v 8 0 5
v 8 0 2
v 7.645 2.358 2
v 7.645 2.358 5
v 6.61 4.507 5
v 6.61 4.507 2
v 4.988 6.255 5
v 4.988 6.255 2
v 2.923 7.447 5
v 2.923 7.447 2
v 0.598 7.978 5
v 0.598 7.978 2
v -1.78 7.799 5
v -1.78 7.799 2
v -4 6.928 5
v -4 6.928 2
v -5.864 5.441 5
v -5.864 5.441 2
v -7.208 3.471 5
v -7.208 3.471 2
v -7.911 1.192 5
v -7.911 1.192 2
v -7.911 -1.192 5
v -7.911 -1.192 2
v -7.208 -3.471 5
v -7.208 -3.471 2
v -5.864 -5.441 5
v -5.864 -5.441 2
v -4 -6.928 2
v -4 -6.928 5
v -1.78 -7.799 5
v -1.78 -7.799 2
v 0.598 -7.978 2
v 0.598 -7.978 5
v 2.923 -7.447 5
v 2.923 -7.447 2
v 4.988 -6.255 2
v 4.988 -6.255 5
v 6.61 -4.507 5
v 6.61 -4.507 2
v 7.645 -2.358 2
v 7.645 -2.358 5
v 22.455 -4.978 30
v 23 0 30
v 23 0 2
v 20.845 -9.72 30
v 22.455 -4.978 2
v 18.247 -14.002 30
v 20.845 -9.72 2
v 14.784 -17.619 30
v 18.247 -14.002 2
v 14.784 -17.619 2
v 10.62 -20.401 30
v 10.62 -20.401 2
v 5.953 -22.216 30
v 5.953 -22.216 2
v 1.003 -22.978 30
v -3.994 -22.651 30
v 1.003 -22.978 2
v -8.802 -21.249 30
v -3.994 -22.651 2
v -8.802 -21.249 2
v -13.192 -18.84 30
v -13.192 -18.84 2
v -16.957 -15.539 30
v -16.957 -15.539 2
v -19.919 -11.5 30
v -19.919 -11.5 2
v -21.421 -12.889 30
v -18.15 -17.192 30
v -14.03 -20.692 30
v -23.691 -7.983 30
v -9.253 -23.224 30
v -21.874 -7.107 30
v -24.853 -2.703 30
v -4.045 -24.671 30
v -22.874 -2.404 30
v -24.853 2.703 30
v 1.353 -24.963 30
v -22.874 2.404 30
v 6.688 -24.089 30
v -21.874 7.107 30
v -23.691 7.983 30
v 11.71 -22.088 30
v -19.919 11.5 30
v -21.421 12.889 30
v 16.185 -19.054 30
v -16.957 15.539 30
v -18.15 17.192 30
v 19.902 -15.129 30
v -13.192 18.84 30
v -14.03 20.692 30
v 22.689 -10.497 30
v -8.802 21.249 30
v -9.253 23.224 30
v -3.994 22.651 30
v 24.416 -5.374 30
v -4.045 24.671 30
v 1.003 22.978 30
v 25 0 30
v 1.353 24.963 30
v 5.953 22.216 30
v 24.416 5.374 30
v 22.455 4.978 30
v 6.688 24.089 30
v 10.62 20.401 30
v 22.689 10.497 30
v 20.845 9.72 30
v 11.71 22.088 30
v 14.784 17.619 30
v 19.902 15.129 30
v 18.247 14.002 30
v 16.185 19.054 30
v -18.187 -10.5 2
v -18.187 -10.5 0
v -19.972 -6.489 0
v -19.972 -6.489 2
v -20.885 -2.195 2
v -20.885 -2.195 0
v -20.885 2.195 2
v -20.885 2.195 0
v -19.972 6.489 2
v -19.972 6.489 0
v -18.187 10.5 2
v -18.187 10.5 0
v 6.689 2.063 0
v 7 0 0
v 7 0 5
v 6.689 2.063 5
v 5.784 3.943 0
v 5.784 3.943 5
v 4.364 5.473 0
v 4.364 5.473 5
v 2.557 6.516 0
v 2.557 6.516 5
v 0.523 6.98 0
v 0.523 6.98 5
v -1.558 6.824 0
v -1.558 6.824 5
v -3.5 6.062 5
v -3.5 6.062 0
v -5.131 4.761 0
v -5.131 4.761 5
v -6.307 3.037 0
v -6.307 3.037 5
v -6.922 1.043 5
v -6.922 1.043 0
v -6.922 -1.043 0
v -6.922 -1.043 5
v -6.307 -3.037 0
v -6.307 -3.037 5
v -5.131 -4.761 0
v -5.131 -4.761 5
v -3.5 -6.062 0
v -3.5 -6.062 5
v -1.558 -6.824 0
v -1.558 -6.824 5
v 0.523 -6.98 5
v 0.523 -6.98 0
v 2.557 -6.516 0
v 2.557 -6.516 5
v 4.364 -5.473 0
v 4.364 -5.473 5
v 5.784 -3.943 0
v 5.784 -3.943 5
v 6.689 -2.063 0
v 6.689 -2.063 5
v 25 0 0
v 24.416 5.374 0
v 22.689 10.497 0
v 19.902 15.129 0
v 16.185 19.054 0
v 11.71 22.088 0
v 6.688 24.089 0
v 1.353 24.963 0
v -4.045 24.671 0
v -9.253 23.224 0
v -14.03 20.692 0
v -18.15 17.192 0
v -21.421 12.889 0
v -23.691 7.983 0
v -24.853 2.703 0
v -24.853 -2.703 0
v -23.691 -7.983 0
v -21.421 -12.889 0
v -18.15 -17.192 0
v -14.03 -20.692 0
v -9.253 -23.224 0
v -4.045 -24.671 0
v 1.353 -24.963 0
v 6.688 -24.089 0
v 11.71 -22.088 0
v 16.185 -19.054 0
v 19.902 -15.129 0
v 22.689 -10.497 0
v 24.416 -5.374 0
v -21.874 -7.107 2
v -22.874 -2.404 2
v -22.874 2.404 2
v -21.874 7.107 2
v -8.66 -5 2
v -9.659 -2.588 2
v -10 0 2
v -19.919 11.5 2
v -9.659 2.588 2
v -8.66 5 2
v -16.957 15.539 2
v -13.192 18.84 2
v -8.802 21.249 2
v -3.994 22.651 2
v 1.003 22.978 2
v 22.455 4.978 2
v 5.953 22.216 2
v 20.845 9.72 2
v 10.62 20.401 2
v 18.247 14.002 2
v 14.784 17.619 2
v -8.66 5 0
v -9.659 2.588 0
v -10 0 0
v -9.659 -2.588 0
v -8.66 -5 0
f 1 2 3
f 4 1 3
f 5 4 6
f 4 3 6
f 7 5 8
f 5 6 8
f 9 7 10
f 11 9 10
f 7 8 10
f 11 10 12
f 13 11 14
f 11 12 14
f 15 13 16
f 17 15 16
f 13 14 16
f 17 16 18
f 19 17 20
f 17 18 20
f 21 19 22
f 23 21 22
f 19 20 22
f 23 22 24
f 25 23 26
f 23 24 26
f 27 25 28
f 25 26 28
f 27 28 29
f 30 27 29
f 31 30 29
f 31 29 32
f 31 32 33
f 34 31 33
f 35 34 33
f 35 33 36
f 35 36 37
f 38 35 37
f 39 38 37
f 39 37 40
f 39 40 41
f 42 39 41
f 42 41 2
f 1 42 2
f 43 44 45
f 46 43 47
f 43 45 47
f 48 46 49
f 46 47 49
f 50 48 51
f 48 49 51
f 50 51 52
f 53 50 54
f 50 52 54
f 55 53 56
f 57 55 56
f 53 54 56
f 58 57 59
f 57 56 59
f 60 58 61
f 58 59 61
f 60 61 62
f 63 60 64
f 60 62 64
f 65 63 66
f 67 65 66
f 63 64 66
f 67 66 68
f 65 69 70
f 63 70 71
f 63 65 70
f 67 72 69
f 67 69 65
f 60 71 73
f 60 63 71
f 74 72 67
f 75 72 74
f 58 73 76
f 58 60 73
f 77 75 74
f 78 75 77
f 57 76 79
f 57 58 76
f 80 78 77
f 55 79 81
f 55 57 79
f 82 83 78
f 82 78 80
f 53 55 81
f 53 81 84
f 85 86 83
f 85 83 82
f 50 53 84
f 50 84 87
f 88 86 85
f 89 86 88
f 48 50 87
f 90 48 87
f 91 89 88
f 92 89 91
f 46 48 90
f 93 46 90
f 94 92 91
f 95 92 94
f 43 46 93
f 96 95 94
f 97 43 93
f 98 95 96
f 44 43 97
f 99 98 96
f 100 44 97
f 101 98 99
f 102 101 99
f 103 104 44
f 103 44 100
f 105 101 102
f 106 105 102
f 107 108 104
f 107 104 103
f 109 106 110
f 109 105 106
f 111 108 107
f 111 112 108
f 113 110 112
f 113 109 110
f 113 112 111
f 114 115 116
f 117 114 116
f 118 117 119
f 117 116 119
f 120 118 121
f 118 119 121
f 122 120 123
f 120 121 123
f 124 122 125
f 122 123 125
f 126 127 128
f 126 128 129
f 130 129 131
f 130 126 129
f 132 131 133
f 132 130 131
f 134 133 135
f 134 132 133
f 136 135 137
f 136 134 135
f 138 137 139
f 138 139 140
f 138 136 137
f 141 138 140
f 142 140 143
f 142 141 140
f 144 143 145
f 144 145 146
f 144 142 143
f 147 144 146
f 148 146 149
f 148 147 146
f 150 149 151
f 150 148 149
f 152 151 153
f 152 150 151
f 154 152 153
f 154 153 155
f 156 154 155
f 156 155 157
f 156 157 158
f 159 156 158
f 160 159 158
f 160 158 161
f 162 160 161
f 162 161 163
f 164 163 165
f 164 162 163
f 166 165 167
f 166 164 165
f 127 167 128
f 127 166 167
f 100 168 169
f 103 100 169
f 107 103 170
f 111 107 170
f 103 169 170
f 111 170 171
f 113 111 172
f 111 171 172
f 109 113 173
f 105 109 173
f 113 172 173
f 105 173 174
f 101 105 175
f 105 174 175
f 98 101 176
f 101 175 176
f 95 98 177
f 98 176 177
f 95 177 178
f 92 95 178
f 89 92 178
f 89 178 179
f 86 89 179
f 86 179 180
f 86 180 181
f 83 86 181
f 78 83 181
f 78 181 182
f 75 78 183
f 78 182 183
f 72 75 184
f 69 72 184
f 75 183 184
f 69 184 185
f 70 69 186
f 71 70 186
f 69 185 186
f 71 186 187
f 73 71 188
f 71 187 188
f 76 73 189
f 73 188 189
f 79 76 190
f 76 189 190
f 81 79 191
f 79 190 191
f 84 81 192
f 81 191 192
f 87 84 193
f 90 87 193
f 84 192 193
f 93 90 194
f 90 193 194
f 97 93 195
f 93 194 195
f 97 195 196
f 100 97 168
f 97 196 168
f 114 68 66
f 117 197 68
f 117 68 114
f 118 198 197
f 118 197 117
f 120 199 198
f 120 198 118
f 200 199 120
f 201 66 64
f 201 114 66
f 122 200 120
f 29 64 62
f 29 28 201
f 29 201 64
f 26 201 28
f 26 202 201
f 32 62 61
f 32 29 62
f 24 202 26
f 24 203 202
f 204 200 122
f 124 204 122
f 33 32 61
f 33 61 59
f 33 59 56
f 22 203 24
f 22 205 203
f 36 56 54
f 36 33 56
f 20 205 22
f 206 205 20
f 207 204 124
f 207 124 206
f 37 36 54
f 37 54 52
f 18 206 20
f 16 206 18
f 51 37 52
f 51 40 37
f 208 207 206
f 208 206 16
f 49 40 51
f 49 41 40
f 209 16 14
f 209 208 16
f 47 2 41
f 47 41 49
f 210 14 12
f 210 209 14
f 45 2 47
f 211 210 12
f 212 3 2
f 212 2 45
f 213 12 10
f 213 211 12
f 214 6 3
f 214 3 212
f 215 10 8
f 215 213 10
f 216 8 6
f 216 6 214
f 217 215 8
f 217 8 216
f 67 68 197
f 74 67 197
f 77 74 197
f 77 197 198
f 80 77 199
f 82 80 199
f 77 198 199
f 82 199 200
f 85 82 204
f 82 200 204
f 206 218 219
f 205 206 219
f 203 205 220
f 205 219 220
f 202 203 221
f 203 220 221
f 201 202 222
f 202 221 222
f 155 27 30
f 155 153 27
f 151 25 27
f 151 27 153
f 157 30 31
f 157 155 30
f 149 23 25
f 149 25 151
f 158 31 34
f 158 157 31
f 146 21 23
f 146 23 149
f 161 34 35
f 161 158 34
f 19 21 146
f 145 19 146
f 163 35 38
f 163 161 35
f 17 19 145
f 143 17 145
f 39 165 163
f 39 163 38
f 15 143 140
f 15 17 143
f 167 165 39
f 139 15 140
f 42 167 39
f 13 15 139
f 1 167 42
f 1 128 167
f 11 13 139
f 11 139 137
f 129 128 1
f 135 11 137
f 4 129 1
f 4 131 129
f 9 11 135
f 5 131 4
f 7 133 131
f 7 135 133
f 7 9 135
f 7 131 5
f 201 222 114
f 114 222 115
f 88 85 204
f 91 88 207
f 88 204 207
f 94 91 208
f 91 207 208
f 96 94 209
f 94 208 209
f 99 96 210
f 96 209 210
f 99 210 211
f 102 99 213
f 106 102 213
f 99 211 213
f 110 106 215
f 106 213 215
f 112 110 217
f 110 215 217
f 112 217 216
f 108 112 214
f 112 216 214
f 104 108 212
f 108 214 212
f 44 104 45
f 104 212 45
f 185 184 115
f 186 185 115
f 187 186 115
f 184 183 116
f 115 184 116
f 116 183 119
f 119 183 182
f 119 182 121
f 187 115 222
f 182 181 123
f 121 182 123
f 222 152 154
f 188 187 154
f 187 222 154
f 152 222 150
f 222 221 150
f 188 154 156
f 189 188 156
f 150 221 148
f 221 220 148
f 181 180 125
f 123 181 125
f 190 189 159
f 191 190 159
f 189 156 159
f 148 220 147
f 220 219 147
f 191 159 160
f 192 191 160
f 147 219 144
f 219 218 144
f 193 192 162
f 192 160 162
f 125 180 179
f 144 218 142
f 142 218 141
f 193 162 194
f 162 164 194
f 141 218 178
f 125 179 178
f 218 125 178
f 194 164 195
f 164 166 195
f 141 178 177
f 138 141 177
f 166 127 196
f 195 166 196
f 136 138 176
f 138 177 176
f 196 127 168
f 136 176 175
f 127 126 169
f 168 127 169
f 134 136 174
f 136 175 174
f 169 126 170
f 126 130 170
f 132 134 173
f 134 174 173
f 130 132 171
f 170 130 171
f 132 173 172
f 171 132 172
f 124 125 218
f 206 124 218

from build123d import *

# Parameters (mm, degrees)
F0_R     = 9
F0_R_2   = 8
F1_DEPTH = 2
F0_R_3   = 7
F2_DEPTH = 5
F0_R_4   = 25
F3_DEPTH = 30


with BuildPart() as f1:
    # F0 (on Top) → F1 (new body)
    with BuildSketch(Plane.XY):
        with BuildLine():
            ThreePointArc((-19.918584, -11.5), (5.952838, -22.216294), (23, 0))
            ThreePointArc((23, 0), (5.952838, 22.216294), (-19.918584, 11.5))
            Line((-19.918584, 11.5), (-18.186533, 10.5))
            Line((-18.186533, 10.5), (-8.660254, 5))
            ThreePointArc((-8.660254, 5), (-10, 0), (-8.660254, -5))
            Line((-8.660254, -5), (-18.186533, -10.5))
            Line((-18.186533, -10.5), (-19.918584, -11.5))
        make_face()
        Circle(F0_R, mode=Mode.SUBTRACT)
        Circle(F0_R)
        Circle(F0_R_2, mode=Mode.SUBTRACT)
        with BuildLine():
            Line((-18.186533, 10.5), (-19.918584, 11.5))
            ThreePointArc((-19.918584, 11.5), (-23, 0), (-19.918584, -11.5))
            Line((-19.918584, -11.5), (-18.186533, -10.5))
            ThreePointArc((-18.186533, -10.5), (-21, 0), (-18.186533, 10.5))
        make_face()
    extrude(amount=F1_DEPTH)

    # F0 (on Top) → F2 (join)
    with BuildSketch(Plane.XY):
        Circle(F0_R_2)
        Circle(F0_R_3, mode=Mode.SUBTRACT)
    extrude(amount=F2_DEPTH)

    # F0 (on Top) → F3 (join)
    with BuildSketch(Plane.XY):
        Circle(F0_R_4)
        with BuildLine():
            ThreePointArc((-19.918584, 11.5), (5.952838, 22.216294), (23, 0))
            ThreePointArc((23, 0), (5.952838, -22.216294), (-19.918584, -11.5))
            ThreePointArc((-19.918584, -11.5), (-23, 0), (-19.918584, 11.5))
        make_face(mode=Mode.SUBTRACT)
    extrude(amount=F3_DEPTH)


solid = f1.part
